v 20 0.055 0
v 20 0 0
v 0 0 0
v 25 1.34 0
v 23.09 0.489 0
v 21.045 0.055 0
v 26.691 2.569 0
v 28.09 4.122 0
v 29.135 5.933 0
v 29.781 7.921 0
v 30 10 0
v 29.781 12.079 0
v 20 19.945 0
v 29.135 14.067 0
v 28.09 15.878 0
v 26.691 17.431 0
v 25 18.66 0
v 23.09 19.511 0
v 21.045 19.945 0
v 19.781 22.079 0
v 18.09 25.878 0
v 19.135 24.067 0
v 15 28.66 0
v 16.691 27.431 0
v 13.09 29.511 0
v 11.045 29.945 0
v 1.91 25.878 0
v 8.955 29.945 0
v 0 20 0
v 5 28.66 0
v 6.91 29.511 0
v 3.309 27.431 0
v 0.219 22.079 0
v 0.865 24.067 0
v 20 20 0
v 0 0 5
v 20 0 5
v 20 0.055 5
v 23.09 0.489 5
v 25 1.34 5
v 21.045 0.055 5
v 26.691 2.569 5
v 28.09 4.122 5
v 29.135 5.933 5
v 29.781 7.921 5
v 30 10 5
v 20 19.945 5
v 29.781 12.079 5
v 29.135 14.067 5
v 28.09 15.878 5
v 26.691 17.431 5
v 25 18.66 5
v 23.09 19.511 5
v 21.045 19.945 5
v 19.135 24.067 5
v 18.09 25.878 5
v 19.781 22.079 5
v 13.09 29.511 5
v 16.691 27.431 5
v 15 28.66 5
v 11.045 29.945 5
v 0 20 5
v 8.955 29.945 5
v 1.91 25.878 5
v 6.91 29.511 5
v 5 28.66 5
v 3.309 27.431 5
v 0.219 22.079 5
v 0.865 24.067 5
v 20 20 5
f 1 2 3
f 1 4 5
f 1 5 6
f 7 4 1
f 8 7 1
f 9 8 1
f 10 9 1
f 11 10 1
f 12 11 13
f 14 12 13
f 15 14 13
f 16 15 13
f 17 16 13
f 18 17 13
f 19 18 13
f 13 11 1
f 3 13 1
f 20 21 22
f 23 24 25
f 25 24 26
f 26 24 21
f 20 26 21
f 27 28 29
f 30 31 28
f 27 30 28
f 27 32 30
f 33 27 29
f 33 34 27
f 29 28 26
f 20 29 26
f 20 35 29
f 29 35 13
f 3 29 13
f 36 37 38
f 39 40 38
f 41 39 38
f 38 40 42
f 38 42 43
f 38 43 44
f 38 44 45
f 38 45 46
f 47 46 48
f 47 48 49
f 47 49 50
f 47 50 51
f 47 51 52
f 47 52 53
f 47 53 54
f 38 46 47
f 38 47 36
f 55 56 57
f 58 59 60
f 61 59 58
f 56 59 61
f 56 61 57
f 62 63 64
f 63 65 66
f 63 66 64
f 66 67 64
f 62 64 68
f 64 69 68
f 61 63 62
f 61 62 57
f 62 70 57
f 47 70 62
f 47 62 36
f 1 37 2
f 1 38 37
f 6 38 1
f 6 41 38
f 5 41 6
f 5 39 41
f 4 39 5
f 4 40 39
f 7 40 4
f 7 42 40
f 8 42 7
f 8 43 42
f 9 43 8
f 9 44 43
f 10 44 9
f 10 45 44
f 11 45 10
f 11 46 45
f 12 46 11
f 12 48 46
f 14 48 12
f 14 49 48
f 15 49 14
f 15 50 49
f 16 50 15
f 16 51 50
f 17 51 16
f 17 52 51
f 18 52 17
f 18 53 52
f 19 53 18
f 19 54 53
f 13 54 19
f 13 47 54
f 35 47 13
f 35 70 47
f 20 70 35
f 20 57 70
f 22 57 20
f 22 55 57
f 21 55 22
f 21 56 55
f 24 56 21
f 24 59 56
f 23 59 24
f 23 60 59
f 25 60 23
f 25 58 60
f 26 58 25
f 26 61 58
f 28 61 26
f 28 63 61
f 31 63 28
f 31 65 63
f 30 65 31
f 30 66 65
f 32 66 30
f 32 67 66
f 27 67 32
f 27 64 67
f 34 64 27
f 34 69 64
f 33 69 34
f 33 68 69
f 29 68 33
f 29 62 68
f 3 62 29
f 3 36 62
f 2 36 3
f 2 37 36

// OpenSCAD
module 2DHeart()
{
    square(20);
    translate([10,20,0]) circle(10);
    translate([20,10,0]) circle(10);
}

module 3DHeart()
{
    linear_extrude(5)
    2DHeart();
}

3DHeart();
